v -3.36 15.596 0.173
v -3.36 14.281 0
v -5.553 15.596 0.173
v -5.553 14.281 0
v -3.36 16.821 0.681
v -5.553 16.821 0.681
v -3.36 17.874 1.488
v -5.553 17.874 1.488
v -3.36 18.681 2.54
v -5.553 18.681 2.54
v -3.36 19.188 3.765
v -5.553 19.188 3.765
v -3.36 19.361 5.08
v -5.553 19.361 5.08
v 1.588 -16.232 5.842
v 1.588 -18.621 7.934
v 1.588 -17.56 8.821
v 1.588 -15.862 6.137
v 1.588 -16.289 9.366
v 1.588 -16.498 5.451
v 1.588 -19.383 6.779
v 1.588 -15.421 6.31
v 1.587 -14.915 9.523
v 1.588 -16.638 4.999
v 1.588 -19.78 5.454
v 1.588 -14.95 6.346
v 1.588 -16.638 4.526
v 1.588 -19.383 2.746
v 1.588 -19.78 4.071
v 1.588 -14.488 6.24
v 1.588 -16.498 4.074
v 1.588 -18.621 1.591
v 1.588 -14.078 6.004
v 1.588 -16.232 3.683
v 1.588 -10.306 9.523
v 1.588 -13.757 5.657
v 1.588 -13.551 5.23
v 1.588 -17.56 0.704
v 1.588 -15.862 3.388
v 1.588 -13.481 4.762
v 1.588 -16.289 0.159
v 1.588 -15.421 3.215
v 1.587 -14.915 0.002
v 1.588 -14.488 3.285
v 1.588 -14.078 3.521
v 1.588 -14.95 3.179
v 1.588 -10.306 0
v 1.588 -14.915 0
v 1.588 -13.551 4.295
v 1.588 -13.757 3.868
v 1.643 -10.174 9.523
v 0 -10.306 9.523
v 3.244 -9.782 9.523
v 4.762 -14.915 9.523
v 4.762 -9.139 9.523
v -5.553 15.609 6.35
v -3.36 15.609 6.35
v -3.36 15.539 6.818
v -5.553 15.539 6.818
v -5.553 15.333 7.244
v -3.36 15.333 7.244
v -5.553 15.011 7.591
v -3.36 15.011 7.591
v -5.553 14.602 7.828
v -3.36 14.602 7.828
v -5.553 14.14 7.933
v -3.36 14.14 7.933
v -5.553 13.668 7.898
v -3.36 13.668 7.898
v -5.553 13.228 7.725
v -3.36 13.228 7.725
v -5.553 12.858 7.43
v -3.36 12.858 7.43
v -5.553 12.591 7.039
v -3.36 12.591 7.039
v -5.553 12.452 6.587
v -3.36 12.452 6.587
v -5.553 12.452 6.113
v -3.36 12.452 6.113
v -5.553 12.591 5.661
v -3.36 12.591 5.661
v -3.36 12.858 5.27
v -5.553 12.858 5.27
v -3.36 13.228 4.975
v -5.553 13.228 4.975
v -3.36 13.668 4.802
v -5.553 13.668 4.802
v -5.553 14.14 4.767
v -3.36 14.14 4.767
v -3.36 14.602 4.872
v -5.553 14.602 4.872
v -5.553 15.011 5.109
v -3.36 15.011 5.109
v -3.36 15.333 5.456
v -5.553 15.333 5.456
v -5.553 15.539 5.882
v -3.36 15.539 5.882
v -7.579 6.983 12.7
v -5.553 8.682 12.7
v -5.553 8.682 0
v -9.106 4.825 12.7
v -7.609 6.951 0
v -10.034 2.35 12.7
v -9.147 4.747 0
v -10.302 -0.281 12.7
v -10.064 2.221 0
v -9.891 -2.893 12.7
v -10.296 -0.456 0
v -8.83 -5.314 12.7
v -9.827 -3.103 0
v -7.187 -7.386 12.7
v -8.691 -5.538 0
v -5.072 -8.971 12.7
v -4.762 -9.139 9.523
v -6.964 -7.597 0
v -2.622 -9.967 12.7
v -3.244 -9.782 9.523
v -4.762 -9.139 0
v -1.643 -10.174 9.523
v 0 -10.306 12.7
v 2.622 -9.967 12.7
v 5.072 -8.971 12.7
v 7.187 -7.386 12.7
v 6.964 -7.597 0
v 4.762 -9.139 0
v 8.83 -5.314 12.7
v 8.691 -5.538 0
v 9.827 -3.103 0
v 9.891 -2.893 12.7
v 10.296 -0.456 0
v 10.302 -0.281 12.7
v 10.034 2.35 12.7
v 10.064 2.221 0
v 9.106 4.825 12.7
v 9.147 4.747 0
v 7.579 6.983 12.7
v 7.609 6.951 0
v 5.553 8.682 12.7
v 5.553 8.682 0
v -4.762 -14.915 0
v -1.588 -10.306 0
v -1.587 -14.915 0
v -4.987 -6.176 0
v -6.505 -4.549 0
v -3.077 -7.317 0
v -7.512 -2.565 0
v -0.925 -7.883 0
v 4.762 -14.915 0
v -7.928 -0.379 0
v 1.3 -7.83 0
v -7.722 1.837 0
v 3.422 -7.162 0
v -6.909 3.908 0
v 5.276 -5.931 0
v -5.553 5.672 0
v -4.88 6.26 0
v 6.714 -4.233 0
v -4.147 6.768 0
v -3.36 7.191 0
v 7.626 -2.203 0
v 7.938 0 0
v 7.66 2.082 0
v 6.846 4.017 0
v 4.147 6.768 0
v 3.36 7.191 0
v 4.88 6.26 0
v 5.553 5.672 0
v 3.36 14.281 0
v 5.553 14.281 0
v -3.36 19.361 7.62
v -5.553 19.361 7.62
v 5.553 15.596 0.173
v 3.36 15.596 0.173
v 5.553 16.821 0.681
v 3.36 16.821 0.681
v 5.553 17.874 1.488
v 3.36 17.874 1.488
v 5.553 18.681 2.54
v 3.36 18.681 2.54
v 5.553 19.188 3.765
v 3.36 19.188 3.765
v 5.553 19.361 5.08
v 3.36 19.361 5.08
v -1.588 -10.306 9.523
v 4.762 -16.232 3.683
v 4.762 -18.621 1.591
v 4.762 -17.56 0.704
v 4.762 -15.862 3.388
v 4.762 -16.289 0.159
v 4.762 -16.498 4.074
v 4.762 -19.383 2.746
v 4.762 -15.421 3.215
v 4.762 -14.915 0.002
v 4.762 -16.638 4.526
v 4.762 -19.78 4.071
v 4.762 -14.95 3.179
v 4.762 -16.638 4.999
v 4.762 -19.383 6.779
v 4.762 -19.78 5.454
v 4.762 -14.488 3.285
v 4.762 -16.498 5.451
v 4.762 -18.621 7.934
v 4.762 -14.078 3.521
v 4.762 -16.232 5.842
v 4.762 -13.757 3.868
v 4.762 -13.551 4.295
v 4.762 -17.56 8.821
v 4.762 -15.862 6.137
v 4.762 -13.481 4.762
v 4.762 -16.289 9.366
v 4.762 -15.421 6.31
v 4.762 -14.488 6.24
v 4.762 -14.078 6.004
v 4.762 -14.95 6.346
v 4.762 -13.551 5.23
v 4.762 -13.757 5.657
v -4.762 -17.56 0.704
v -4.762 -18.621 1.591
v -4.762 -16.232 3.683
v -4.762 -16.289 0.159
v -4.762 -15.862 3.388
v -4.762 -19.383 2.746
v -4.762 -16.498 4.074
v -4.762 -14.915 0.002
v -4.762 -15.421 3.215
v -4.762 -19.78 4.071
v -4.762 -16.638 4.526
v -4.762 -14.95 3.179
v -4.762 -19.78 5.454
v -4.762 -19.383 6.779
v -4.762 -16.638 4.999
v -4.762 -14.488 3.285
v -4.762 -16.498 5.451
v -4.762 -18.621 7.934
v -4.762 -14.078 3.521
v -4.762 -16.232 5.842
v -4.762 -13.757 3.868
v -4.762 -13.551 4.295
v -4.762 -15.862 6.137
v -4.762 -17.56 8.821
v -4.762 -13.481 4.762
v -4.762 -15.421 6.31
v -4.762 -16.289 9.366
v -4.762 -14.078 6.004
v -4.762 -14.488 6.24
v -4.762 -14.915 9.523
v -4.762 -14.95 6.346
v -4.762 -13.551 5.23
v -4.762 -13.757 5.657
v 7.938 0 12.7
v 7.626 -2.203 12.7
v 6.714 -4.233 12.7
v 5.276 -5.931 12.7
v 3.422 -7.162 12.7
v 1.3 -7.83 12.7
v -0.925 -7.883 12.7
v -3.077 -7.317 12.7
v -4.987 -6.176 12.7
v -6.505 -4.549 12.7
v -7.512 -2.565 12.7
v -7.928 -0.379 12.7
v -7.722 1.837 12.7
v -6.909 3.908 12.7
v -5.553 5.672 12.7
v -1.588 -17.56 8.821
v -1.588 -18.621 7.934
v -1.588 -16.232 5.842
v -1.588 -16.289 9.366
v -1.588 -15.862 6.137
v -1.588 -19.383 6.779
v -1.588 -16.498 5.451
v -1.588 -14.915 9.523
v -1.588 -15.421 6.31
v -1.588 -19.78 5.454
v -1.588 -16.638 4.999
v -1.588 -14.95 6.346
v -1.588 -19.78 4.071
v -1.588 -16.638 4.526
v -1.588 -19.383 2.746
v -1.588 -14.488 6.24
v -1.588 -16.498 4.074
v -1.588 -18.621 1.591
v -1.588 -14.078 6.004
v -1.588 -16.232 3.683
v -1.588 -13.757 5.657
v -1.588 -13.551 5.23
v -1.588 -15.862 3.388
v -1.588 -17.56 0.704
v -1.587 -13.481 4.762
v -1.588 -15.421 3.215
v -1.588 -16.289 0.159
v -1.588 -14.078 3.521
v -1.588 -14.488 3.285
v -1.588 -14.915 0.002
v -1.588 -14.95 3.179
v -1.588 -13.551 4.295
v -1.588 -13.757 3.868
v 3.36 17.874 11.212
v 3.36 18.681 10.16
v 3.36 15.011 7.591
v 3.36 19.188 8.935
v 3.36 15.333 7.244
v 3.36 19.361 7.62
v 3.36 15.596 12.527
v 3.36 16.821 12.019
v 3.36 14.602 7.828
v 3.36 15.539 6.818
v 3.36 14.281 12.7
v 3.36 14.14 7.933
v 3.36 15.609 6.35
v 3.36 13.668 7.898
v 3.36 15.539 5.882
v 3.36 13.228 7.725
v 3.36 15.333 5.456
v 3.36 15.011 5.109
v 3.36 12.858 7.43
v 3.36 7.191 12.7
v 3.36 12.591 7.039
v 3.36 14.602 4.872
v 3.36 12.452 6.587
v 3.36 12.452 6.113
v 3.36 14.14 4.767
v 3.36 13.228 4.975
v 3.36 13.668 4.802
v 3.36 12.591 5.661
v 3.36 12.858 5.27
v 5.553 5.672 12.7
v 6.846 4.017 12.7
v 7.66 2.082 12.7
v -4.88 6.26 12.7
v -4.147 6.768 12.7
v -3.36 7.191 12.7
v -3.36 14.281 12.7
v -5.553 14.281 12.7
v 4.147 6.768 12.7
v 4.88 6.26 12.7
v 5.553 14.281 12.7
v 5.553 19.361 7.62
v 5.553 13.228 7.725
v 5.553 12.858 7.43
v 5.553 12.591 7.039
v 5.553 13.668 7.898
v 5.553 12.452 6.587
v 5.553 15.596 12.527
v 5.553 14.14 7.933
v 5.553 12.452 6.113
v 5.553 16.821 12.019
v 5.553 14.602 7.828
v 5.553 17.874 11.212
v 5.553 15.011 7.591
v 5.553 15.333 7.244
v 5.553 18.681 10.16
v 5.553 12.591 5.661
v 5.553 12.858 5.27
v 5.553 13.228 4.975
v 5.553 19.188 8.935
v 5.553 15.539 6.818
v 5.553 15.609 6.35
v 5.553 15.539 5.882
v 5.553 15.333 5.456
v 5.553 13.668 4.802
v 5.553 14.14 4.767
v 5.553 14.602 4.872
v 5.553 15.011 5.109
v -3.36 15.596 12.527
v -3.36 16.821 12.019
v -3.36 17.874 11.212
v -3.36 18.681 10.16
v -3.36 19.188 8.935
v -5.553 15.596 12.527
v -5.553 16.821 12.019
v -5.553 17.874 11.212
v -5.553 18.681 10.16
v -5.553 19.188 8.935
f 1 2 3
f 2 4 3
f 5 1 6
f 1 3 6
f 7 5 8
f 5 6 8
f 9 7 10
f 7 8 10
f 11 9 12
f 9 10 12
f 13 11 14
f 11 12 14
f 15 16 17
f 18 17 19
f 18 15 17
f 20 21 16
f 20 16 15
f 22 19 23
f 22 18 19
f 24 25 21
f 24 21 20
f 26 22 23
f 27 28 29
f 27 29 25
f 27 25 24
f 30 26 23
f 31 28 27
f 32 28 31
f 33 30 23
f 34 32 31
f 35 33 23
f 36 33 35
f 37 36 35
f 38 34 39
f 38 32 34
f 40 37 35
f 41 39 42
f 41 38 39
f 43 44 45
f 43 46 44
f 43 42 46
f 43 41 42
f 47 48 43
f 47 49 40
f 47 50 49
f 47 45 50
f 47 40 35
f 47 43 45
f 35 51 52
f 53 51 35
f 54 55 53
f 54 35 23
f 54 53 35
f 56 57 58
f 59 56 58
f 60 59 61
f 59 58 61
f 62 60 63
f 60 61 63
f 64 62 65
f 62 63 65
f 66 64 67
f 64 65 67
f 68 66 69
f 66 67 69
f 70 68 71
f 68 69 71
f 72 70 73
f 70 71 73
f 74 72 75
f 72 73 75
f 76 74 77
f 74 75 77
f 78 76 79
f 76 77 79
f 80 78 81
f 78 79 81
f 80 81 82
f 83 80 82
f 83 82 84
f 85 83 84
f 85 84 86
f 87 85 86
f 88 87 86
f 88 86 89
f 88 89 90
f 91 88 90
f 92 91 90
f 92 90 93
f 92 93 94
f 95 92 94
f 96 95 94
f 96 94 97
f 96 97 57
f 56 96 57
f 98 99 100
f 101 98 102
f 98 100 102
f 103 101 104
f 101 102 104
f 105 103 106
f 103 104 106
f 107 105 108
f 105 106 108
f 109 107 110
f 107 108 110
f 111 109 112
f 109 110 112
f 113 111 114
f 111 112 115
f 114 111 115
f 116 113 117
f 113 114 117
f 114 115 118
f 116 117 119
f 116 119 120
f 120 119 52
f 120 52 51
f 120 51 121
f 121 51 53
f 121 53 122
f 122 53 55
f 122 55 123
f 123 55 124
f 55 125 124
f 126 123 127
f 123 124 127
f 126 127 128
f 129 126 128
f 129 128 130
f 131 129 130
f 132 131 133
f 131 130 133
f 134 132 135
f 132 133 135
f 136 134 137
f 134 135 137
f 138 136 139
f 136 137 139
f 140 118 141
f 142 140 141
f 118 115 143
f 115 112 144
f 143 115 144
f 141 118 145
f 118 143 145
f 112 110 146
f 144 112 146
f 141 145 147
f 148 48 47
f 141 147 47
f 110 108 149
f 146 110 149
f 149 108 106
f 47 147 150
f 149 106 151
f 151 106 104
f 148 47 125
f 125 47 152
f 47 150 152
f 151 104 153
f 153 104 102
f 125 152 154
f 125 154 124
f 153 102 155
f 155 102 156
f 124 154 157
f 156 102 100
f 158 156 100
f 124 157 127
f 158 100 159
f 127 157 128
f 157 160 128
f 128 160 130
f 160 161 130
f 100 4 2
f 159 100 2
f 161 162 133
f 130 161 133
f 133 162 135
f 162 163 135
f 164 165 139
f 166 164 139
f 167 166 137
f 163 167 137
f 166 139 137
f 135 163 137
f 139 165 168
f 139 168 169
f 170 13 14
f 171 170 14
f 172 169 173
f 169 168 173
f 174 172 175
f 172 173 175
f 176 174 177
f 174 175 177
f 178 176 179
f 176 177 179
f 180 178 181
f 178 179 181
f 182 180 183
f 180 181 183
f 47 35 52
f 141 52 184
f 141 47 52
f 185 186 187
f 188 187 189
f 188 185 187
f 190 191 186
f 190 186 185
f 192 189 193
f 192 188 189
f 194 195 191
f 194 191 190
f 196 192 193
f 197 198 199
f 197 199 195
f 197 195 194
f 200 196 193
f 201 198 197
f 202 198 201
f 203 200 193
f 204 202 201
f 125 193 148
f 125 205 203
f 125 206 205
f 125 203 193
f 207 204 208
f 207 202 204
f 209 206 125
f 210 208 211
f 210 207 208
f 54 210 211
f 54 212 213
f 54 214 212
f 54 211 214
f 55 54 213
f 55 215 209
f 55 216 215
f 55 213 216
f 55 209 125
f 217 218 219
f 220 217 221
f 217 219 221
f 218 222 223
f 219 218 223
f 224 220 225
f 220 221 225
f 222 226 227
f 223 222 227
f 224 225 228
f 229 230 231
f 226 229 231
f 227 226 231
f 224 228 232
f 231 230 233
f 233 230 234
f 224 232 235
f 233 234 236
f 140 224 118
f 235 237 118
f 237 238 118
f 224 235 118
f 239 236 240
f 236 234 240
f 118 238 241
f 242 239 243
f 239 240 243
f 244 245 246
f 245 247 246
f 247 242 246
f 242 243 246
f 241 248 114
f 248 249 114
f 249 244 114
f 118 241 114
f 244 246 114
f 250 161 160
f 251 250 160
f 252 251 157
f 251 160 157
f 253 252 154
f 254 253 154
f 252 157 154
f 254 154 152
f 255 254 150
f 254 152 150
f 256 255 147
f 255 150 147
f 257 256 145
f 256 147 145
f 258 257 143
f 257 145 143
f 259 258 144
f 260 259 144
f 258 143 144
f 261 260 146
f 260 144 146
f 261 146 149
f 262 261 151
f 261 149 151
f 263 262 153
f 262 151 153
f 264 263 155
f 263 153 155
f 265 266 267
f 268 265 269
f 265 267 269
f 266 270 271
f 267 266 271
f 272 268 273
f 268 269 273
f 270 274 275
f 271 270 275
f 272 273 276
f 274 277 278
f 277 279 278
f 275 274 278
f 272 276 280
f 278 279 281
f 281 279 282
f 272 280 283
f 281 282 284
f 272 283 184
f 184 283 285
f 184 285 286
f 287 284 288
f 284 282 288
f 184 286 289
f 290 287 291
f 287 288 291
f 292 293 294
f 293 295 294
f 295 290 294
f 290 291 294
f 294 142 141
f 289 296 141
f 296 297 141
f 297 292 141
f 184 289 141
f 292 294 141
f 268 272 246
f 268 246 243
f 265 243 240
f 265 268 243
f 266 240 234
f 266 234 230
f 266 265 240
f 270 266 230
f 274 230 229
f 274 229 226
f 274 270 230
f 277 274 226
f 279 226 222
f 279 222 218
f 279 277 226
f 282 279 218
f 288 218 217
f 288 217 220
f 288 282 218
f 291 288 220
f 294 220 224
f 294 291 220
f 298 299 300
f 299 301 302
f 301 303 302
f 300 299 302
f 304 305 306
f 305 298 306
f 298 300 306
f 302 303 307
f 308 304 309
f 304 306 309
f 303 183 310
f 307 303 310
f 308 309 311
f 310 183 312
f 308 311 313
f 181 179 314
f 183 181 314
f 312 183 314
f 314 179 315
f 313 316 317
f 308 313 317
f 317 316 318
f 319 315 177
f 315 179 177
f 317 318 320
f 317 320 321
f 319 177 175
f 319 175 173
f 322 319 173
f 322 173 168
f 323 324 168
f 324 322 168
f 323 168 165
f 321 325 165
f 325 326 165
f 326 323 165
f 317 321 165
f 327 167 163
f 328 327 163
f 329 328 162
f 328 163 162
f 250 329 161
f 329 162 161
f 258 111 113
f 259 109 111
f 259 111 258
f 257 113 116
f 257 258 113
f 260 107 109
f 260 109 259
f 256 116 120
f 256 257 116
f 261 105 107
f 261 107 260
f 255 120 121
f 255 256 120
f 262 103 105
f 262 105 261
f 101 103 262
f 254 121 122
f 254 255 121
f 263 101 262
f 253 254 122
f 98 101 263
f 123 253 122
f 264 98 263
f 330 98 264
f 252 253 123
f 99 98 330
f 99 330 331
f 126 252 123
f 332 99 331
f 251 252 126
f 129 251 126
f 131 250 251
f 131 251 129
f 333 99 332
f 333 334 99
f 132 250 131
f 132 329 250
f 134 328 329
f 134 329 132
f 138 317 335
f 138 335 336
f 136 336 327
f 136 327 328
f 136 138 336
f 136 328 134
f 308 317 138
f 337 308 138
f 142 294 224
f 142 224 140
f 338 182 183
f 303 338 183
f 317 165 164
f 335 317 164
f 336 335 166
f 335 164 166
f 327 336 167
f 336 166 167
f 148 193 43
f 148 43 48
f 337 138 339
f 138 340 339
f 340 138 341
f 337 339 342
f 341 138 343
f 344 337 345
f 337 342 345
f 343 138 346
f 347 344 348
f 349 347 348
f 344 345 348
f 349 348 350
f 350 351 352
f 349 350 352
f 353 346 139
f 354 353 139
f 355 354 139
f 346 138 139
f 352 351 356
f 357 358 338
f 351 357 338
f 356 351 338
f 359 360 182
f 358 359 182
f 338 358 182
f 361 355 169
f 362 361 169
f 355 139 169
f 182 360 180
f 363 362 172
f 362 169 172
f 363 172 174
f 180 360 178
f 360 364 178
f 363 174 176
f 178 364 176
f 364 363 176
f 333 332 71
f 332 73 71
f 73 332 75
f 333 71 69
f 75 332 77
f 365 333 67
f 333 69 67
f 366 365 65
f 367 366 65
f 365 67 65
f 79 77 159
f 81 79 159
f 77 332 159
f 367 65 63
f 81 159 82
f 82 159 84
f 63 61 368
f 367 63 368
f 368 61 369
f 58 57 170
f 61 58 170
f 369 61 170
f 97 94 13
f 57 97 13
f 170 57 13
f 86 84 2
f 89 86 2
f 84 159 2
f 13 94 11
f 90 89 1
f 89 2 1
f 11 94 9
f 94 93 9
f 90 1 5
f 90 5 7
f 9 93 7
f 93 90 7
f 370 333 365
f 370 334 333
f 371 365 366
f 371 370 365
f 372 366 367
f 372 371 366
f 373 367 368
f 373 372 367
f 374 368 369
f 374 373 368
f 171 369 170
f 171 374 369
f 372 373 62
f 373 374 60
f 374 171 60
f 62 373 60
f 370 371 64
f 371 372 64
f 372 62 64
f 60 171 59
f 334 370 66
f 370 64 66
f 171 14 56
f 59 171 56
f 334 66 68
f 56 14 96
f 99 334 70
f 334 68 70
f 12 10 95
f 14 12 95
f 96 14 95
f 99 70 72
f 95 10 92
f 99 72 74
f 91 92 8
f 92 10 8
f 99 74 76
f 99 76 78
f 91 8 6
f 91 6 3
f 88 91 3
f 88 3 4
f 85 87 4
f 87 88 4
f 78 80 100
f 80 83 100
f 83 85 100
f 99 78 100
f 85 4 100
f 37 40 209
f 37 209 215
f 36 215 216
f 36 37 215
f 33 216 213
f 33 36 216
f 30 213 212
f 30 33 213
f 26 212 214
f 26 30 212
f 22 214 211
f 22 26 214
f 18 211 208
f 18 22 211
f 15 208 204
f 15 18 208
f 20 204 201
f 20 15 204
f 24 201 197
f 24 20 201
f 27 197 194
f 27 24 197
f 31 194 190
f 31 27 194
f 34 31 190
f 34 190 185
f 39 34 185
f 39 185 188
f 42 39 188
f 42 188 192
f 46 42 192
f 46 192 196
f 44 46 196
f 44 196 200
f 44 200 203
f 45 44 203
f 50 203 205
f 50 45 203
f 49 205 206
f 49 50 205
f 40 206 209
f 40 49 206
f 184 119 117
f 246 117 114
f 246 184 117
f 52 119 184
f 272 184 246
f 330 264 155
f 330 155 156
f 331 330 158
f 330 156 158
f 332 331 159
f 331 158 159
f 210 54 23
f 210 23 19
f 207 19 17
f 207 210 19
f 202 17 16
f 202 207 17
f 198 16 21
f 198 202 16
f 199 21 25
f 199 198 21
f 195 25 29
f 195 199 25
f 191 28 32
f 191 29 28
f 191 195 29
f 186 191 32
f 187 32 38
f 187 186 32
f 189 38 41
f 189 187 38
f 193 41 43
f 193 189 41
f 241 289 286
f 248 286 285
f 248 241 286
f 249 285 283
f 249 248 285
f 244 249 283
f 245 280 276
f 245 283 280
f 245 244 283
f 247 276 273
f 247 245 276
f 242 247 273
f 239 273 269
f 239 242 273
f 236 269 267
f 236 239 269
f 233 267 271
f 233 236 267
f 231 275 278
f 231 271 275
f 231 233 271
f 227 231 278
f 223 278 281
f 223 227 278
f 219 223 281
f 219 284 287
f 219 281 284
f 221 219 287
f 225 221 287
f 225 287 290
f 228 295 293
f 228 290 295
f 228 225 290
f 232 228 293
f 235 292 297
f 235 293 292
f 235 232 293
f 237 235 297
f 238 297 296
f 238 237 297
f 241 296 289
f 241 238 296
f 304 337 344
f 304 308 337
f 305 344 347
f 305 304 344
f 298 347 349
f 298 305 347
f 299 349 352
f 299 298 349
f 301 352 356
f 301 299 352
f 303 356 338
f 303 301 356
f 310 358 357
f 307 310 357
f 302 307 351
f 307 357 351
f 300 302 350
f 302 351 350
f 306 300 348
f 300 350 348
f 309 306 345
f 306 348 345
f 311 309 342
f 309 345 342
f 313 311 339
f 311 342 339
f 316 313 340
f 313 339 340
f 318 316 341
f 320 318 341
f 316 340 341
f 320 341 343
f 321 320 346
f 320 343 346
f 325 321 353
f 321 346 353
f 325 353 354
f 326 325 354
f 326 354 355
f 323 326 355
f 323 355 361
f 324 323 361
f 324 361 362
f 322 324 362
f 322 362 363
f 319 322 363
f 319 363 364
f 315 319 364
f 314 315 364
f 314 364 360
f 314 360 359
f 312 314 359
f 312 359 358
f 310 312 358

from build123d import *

# Parameters (mm, degrees)
F2_DEPTH  = 12.7
F1_R      = 1.5875
F3_DEPTH  = 4.7625
F4_R      = 1.5875
F5_DEPTH  = 15.859309
F9_W      = 1.5875
F9_H      = 9.525
F10_DEPTH = 25.4
F12_R     = 5.08


with BuildPart() as f2:
    # F0 (on Top) → F2 (new body)
    with BuildSketch(Plane.XY):
        with BuildLine():
            Line((-5.552635, 5.67205), (-5.552635, 8.681886))
            ThreePointArc((-5.552635, 8.681886), (0, -10.305673), (5.552635, 8.681886))
            Line((5.552635, 8.681886), (5.552635, 5.67205))
            ThreePointArc((5.552635, 5.67205), (7.317033, 3.076513), (7.9375, 0))
            ThreePointArc((7.9375, 0), (-3.076513, -7.317033), (-5.552635, 5.67205))
        make_face()
        with BuildLine():
            Line((-5.552635, 19.361428), (-5.552635, 8.681886))
            Line((-5.552635, 8.681886), (-5.552635, 5.67205))
            ThreePointArc((-5.552635, 5.67205), (-4.520661, 6.52438), (-3.360147, 7.191197))
            Line((-3.360147, 7.191197), (-3.360147, 19.361428))
            Line((-3.360147, 19.361428), (-5.552635, 19.361428))
        make_face()
        with BuildLine():
            Line((5.552635, 5.67205), (5.552635, 8.681886))
            Line((5.552635, 8.681886), (5.552635, 19.361428))
            Line((5.552635, 19.361428), (3.360147, 19.361428))
            Line((3.360147, 19.361428), (3.360147, 7.191197))
            ThreePointArc((3.360147, 7.191197), (4.520661, 6.52438), (5.552635, 5.67205))
        make_face()
    extrude(amount=F2_DEPTH)

    # F1 (on Right) → F3 (join, symmetric)
    with BuildSketch(Plane.YZ):
        with BuildLine():
            Line((-7.938393, 9.522529), (-14.914774, 9.522529))
            ThreePointArc((-14.914774, 9.522529), (-19.830673, 4.7625), (-14.914774, 0.002471))
            Line((-14.914774, 0.002471), (-14.914774, 0))
            Line((-14.914774, 0), (-7.938393, 0))
            Line((-7.938393, 0), (-7.938393, 9.522529))
        make_face()
        with Locations((-15.068173, 4.7625)):
            Circle(F1_R, mode=Mode.SUBTRACT)
    extrude(amount=F3_DEPTH, both=True)

    # F4 (on face) → F5 (cut, through all)
    with BuildSketch(Plane.YZ.offset(5.552635)):
        with Locations((14.021657, 6.35)):
            Circle(F4_R)
    extrude(amount=-F5_DEPTH, mode=Mode.SUBTRACT)


with BuildPart() as f6_1:
    # F6: copy of F2
    add(f2.part)


with BuildPart() as f8_1:
    # F8: copy of F2
    add(f2.part)


with BuildPart() as f10_tool:
    # F9 (on Top) → F10 (new body)
    with BuildSketch(Plane.XY):
        with Locations((0.79375, -15.068173)):
            Rectangle(F9_W, F9_H)
        with Locations((-0.79375, -15.068173)):
            Rectangle(F9_W, F9_H)
    extrude(amount=F10_DEPTH)


with BuildPart() as f2_1:
    add(f2.part)

    # F10: cut by f10_tool
    add(f10_tool.part, mode=Mode.SUBTRACT)


with BuildPart() as f8_1_1:
    add(f8_1.part)

    # F10: cut by f10_tool
    add(f10_tool.part, mode=Mode.SUBTRACT)

    # F12
    f12_edges = [f8_1_1.edges().sort_by_distance(p)[0] for p in [
        (-4.456391, 19.361428, 12.7),
        (4.456391, 19.361428, 12.7),
        (-4.456391, 19.361428, 0),
        (4.456391, 19.361428, 0),
    ]]
    fillet(f12_edges, radius=F12_R)


solid = f8_1_1.part
